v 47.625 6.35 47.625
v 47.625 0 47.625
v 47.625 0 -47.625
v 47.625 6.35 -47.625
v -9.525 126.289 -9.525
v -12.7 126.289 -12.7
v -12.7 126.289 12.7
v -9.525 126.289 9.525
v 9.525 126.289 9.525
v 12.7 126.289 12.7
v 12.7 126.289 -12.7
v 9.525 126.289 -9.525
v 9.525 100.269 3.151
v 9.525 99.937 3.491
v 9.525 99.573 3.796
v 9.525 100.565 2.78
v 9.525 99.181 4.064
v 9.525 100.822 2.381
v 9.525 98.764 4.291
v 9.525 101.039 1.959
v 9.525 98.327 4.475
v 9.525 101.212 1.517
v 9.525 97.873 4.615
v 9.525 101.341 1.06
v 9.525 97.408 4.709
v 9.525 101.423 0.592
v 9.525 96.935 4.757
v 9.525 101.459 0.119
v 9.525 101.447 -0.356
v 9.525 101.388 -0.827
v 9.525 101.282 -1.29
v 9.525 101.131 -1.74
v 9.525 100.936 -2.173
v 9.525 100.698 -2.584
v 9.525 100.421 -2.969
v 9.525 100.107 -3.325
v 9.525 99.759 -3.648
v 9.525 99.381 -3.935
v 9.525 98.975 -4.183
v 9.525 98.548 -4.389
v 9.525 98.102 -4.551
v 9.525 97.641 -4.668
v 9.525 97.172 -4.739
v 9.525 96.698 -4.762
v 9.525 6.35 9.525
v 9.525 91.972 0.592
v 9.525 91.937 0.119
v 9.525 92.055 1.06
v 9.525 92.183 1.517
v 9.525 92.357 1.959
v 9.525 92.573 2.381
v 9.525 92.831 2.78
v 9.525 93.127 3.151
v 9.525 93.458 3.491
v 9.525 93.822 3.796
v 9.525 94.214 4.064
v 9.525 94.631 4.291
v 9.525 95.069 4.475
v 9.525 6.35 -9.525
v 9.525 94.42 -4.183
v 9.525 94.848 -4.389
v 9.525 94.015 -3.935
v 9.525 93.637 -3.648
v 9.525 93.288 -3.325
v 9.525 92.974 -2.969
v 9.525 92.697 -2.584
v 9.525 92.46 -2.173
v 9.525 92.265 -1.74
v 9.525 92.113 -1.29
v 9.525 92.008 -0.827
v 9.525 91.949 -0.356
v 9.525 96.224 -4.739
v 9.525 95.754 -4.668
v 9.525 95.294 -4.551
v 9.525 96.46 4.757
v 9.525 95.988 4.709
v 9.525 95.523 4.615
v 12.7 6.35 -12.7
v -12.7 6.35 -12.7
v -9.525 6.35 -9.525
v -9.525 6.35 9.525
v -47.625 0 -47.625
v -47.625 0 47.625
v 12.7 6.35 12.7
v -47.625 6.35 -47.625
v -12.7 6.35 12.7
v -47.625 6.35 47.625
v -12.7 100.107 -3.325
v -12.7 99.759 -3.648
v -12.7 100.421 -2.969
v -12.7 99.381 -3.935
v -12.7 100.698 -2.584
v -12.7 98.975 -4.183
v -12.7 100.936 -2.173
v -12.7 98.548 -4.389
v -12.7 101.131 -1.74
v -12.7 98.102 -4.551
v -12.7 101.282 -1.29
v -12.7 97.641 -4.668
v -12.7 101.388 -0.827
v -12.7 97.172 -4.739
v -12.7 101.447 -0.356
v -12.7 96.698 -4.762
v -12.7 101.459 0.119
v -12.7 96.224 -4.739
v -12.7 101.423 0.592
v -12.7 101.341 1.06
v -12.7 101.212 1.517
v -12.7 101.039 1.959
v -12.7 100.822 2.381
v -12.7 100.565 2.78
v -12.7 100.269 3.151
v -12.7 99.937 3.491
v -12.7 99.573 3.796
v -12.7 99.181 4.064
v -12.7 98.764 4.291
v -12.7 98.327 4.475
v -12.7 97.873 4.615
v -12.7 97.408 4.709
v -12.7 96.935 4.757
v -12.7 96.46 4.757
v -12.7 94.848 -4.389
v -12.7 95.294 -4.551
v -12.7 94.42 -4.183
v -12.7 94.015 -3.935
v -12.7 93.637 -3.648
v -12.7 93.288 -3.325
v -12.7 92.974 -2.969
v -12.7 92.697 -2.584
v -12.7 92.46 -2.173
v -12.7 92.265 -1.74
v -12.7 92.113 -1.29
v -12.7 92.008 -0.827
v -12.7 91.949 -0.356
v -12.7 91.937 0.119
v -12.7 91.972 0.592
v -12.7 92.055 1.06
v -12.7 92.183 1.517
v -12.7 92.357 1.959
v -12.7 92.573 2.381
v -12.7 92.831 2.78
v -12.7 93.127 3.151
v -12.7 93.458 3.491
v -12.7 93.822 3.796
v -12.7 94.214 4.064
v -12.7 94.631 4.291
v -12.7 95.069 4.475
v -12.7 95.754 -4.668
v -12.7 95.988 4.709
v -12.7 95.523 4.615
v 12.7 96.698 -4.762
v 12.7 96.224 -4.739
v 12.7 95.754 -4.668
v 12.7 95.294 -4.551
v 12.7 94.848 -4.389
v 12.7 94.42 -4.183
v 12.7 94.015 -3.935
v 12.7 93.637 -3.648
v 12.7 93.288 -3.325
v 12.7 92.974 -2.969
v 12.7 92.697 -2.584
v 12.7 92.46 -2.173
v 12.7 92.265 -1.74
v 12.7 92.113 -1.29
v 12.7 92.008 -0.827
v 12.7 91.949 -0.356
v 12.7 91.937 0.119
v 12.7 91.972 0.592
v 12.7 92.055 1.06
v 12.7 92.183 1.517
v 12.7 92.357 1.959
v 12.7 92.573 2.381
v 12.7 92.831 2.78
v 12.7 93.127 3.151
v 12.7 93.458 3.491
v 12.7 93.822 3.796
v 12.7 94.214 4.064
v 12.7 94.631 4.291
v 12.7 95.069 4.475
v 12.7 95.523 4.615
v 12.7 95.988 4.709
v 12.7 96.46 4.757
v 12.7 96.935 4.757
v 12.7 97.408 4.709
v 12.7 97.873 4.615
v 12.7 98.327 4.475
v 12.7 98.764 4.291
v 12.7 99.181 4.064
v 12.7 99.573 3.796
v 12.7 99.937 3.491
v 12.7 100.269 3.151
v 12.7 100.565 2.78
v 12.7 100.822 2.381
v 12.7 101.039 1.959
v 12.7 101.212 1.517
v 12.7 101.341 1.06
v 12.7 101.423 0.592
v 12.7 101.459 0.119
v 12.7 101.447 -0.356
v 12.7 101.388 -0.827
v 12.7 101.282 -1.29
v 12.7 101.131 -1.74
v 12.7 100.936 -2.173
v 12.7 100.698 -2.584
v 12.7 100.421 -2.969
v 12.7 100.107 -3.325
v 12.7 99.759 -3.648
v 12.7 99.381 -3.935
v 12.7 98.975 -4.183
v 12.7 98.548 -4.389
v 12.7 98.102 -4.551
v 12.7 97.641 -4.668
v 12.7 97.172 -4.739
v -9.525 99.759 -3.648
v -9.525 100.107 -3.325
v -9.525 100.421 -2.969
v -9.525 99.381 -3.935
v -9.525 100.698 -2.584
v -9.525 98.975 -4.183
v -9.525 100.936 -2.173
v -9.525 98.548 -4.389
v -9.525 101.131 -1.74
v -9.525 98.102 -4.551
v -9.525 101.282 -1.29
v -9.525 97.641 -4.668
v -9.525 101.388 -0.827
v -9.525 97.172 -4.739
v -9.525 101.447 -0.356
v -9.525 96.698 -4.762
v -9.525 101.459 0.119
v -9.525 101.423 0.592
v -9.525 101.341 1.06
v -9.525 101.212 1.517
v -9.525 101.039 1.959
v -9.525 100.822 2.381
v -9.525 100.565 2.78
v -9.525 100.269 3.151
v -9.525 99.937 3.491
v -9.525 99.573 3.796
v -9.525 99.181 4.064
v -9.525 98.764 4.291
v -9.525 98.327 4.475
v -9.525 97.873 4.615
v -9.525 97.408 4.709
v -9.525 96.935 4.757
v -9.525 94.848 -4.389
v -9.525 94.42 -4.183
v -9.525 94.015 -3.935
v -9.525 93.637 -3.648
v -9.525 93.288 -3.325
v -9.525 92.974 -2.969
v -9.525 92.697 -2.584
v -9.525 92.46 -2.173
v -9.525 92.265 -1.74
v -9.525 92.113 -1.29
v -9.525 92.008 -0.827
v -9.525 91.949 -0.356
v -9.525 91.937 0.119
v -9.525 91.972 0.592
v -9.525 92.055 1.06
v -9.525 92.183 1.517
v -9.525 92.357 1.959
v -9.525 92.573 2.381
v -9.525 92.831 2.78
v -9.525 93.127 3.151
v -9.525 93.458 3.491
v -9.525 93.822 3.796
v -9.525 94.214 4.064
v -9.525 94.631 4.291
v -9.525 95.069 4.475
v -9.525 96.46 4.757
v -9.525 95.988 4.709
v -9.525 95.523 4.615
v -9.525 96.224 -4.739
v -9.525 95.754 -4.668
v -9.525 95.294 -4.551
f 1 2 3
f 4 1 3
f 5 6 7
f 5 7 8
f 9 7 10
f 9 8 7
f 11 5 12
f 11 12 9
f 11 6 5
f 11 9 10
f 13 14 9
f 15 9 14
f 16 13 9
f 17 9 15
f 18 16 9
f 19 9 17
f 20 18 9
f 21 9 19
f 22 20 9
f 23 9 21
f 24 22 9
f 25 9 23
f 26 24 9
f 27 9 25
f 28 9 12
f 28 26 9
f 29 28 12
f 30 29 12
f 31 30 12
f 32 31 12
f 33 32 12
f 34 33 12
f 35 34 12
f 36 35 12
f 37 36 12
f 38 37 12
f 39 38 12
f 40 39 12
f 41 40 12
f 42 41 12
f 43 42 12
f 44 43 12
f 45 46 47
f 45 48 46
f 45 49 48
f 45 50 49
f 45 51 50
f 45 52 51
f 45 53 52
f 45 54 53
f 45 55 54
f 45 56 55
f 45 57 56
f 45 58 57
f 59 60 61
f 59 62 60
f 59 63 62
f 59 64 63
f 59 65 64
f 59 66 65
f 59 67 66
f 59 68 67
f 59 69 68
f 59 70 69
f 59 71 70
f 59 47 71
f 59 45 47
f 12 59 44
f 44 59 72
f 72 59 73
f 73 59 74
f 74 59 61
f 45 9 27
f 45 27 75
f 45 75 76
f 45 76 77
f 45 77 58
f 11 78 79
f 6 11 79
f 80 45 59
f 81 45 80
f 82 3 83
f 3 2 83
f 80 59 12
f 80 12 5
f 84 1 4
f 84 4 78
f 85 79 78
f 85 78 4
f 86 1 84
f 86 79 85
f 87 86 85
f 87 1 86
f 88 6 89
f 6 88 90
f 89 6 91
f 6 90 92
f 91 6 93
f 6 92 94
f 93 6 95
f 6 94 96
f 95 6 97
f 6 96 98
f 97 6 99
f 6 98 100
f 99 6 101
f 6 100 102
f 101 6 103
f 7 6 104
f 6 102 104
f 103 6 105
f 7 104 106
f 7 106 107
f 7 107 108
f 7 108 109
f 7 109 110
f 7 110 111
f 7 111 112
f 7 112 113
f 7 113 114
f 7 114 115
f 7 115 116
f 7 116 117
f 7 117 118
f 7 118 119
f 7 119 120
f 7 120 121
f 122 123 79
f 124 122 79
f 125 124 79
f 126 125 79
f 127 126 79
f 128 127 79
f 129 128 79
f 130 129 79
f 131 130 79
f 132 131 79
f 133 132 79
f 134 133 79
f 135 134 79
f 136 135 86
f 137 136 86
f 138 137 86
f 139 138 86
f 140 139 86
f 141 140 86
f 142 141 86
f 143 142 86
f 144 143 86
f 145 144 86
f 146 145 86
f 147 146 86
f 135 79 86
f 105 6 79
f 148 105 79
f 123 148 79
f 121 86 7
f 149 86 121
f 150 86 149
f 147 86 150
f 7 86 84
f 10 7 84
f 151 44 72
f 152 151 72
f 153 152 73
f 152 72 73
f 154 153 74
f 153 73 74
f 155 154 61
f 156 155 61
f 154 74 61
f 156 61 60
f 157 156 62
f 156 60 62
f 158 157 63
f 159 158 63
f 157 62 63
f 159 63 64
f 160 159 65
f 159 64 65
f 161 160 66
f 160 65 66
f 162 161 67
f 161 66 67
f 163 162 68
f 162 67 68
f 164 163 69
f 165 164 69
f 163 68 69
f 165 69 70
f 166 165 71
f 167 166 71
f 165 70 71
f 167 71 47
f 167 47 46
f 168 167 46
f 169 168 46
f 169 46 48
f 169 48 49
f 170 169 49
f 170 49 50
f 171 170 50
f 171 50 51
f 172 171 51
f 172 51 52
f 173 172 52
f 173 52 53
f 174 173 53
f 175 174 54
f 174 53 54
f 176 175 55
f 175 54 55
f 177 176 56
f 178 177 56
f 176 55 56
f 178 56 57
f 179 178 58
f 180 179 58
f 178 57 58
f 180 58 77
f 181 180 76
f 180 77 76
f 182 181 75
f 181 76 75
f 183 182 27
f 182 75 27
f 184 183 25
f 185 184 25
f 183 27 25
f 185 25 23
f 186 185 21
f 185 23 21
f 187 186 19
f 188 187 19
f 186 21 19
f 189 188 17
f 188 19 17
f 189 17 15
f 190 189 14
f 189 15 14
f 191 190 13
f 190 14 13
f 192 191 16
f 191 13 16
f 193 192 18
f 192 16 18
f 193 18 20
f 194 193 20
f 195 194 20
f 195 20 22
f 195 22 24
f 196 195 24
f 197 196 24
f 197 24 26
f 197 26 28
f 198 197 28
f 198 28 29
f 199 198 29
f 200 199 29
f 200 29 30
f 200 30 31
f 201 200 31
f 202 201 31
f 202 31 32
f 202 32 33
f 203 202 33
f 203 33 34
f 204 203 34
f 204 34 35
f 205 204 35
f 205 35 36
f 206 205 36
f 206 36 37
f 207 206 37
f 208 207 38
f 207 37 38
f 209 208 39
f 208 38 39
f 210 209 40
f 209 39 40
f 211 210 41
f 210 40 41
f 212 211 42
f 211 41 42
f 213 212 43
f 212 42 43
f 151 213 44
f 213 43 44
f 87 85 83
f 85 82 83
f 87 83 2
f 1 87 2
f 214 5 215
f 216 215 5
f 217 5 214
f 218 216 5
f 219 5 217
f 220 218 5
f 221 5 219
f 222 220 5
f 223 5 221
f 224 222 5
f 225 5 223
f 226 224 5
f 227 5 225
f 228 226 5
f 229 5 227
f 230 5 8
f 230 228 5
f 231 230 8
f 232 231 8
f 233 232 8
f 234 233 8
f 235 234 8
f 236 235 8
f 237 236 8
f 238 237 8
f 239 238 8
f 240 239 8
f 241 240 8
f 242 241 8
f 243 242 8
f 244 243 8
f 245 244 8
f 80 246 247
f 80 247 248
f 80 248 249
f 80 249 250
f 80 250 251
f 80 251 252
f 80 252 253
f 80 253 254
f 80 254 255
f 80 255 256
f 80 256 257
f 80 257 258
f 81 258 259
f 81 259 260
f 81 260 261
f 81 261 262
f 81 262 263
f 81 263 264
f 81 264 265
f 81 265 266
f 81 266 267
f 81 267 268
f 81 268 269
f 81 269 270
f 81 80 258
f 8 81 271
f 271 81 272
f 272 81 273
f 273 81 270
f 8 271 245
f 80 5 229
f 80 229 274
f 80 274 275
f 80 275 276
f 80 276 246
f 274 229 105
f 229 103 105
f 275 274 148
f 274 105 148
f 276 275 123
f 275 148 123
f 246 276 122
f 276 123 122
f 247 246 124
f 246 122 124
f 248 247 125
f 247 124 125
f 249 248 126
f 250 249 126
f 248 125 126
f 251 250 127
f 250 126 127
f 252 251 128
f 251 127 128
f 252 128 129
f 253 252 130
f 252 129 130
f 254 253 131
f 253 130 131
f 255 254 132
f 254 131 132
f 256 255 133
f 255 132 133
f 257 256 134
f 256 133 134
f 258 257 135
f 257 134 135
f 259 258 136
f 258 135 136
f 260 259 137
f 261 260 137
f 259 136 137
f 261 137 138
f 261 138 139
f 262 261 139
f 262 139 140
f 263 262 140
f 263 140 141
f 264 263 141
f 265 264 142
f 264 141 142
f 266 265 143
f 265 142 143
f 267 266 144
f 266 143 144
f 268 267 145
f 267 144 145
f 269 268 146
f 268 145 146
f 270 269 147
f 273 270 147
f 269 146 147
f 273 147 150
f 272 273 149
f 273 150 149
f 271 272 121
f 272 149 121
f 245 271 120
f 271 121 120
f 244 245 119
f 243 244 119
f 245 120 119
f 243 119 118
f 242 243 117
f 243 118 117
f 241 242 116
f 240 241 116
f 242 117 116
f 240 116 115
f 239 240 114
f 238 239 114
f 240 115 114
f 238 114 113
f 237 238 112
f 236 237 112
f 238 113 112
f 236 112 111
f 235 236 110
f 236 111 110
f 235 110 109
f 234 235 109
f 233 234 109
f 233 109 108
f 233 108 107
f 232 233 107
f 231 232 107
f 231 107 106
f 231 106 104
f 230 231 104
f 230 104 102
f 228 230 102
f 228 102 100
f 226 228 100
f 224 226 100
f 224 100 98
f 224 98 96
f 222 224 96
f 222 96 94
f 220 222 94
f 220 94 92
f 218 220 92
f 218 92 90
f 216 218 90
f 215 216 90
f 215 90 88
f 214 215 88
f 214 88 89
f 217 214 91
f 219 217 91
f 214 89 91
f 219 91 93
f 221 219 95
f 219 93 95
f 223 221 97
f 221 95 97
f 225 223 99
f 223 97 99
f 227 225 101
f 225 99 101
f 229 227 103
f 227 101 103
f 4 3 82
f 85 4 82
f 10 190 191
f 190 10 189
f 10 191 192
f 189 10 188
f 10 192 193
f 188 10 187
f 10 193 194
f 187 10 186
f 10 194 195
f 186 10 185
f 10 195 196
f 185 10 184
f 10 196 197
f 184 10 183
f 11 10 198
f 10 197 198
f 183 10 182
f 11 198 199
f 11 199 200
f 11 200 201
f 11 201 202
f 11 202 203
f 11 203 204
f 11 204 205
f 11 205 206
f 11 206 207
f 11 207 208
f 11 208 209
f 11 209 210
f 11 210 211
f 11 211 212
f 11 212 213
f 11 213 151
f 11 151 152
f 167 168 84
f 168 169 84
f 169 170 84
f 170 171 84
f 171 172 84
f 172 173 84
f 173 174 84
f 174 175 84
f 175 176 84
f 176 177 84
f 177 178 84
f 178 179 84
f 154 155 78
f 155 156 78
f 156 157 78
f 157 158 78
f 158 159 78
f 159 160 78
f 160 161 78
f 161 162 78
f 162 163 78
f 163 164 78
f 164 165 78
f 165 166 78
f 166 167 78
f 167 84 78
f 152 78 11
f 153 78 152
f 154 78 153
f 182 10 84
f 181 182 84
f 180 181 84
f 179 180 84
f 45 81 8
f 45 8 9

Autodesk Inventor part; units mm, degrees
ref_plane "YZ Plane" through (0, 0, 0) normal (1, 0, 0) x (0, 1, 0)
ref_plane "XZ Plane" through (0, 0, 0) normal (0, 1, 0) x (-1, 0, 0)
ref_plane "XY Plane" through (0, 0, 0) normal (0, 0, 1) x (1, 0, 0)
sketch "Sketch1" plane through (0, 0, 0) normal (0, 1, 0) x (-1, 0, 0)
  line L0 (47.625, 47.625) -> (-47.625, 47.625)
  line L1 (-47.625, 47.625) -> (-47.625, -47.625)
  line L2 (-47.625, -47.625) -> (47.625, -47.625)
  line L3 (47.625, -47.625) -> (47.625, 47.625)
  line L4 (47.625, 47.625) -> (-47.625, -47.625) construction
  line L5 (-47.625, 47.625) -> (47.625, -47.625) construction
  point P0 (0, 0)
  dimension "d0" = 95.25
  dimension "d1" = 95.25
extrude "Extrusion1" add sketch "Sketch1" along normal blind 6.35
sketch "Sketch2" plane through (0, 6.35, 0) normal (0, 1, 0) x (1, 0, 0)
  line L0 (-12.7, -12.7) -> (12.7, -12.7)
  line L1 (12.7, -12.7) -> (12.7, 12.7)
  line L2 (12.7, 12.7) -> (-12.7, 12.7)
  line L3 (-12.7, 12.7) -> (-12.7, -12.7)
  line L4 (-12.7, -12.7) -> (12.7, 12.7) construction
  line L5 (12.7, -12.7) -> (-12.7, 12.7) construction
  line L6 (-9.525, -9.525) -> (9.525, -9.525)
  line L7 (9.525, -9.525) -> (9.525, 9.525)
  line L8 (9.525, 9.525) -> (-9.525, 9.525)
  line L9 (-9.525, 9.525) -> (-9.525, -9.525)
  line L10 (-9.525, -9.525) -> (9.525, 9.525) construction
  line L11 (9.525, -9.525) -> (-9.525, 9.525) construction
  line L12 (47.625, -47.625) -> (47.625, 47.625) projected
  line L13 (-47.625, -47.625) -> (47.625, -47.625) projected
  point P0 (0, 0)
  point P1 (0, 0)
  dimension "d4" = 25.4
  dimension "d5" = 25.4
  dimension "d6" = 3.175
  dimension "d7" = 3.175
  dimension "d8" = 34.925
  dimension "d14" = 34.925
extrude "Extrusion2" add sketch "Sketch2" along normal blind 119.9388
sketch "Sketch14" plane through (12.7, 6.35, 12.7) normal (1, 0, 0) x (0, 0, -1)
  line L0 (-34.925, -6.35) -> (60.325, -6.35) projected
  point P0 (12.7, -6.35)
  point P1 (12.7, 90.3478)
  dimension "d72" = 96.6978
hole "Hole6" at (12.7, 96.6978, 0) direction (-1, 0, 0) diameter 9.525 end through all
sketch "Sketch8" plane through (-12.7, 6.35, 12.7) normal (0, 0, 1) x (1, 0, 0)
  point P0 (12.7, 50.8)
sketch "Sketch9" plane through (-9.525, 6.35, -9.525) normal (0, 0, 1) x (1, 0, 0)
  point P0 (9.525, 50.8)
equation "\"d0\" = width"
equation "\"d1\" = length"
equation "\"d2\" = thickness"
equation "\"d9\" = heightOfPostAbovePlate"
equation "\"width\" = 95.25"
equation "\"length\" = 95.25"
equation "\"thickness\" = 6.35"
equation "\"totalHeight\" = 152.4"
equation "\"distanceFromFloorToBottomOfPan\" = 26.1112"
equation "\"thicknessOfPan\" = 3.175"
equation "\"heightOfPostAbovePlate\" = -thickness + totalHeight - distanceFromFloorToBottomOfPan"
properties part number "SupportPlateWithPostOnlyV01" material "Aluminum 6061"
